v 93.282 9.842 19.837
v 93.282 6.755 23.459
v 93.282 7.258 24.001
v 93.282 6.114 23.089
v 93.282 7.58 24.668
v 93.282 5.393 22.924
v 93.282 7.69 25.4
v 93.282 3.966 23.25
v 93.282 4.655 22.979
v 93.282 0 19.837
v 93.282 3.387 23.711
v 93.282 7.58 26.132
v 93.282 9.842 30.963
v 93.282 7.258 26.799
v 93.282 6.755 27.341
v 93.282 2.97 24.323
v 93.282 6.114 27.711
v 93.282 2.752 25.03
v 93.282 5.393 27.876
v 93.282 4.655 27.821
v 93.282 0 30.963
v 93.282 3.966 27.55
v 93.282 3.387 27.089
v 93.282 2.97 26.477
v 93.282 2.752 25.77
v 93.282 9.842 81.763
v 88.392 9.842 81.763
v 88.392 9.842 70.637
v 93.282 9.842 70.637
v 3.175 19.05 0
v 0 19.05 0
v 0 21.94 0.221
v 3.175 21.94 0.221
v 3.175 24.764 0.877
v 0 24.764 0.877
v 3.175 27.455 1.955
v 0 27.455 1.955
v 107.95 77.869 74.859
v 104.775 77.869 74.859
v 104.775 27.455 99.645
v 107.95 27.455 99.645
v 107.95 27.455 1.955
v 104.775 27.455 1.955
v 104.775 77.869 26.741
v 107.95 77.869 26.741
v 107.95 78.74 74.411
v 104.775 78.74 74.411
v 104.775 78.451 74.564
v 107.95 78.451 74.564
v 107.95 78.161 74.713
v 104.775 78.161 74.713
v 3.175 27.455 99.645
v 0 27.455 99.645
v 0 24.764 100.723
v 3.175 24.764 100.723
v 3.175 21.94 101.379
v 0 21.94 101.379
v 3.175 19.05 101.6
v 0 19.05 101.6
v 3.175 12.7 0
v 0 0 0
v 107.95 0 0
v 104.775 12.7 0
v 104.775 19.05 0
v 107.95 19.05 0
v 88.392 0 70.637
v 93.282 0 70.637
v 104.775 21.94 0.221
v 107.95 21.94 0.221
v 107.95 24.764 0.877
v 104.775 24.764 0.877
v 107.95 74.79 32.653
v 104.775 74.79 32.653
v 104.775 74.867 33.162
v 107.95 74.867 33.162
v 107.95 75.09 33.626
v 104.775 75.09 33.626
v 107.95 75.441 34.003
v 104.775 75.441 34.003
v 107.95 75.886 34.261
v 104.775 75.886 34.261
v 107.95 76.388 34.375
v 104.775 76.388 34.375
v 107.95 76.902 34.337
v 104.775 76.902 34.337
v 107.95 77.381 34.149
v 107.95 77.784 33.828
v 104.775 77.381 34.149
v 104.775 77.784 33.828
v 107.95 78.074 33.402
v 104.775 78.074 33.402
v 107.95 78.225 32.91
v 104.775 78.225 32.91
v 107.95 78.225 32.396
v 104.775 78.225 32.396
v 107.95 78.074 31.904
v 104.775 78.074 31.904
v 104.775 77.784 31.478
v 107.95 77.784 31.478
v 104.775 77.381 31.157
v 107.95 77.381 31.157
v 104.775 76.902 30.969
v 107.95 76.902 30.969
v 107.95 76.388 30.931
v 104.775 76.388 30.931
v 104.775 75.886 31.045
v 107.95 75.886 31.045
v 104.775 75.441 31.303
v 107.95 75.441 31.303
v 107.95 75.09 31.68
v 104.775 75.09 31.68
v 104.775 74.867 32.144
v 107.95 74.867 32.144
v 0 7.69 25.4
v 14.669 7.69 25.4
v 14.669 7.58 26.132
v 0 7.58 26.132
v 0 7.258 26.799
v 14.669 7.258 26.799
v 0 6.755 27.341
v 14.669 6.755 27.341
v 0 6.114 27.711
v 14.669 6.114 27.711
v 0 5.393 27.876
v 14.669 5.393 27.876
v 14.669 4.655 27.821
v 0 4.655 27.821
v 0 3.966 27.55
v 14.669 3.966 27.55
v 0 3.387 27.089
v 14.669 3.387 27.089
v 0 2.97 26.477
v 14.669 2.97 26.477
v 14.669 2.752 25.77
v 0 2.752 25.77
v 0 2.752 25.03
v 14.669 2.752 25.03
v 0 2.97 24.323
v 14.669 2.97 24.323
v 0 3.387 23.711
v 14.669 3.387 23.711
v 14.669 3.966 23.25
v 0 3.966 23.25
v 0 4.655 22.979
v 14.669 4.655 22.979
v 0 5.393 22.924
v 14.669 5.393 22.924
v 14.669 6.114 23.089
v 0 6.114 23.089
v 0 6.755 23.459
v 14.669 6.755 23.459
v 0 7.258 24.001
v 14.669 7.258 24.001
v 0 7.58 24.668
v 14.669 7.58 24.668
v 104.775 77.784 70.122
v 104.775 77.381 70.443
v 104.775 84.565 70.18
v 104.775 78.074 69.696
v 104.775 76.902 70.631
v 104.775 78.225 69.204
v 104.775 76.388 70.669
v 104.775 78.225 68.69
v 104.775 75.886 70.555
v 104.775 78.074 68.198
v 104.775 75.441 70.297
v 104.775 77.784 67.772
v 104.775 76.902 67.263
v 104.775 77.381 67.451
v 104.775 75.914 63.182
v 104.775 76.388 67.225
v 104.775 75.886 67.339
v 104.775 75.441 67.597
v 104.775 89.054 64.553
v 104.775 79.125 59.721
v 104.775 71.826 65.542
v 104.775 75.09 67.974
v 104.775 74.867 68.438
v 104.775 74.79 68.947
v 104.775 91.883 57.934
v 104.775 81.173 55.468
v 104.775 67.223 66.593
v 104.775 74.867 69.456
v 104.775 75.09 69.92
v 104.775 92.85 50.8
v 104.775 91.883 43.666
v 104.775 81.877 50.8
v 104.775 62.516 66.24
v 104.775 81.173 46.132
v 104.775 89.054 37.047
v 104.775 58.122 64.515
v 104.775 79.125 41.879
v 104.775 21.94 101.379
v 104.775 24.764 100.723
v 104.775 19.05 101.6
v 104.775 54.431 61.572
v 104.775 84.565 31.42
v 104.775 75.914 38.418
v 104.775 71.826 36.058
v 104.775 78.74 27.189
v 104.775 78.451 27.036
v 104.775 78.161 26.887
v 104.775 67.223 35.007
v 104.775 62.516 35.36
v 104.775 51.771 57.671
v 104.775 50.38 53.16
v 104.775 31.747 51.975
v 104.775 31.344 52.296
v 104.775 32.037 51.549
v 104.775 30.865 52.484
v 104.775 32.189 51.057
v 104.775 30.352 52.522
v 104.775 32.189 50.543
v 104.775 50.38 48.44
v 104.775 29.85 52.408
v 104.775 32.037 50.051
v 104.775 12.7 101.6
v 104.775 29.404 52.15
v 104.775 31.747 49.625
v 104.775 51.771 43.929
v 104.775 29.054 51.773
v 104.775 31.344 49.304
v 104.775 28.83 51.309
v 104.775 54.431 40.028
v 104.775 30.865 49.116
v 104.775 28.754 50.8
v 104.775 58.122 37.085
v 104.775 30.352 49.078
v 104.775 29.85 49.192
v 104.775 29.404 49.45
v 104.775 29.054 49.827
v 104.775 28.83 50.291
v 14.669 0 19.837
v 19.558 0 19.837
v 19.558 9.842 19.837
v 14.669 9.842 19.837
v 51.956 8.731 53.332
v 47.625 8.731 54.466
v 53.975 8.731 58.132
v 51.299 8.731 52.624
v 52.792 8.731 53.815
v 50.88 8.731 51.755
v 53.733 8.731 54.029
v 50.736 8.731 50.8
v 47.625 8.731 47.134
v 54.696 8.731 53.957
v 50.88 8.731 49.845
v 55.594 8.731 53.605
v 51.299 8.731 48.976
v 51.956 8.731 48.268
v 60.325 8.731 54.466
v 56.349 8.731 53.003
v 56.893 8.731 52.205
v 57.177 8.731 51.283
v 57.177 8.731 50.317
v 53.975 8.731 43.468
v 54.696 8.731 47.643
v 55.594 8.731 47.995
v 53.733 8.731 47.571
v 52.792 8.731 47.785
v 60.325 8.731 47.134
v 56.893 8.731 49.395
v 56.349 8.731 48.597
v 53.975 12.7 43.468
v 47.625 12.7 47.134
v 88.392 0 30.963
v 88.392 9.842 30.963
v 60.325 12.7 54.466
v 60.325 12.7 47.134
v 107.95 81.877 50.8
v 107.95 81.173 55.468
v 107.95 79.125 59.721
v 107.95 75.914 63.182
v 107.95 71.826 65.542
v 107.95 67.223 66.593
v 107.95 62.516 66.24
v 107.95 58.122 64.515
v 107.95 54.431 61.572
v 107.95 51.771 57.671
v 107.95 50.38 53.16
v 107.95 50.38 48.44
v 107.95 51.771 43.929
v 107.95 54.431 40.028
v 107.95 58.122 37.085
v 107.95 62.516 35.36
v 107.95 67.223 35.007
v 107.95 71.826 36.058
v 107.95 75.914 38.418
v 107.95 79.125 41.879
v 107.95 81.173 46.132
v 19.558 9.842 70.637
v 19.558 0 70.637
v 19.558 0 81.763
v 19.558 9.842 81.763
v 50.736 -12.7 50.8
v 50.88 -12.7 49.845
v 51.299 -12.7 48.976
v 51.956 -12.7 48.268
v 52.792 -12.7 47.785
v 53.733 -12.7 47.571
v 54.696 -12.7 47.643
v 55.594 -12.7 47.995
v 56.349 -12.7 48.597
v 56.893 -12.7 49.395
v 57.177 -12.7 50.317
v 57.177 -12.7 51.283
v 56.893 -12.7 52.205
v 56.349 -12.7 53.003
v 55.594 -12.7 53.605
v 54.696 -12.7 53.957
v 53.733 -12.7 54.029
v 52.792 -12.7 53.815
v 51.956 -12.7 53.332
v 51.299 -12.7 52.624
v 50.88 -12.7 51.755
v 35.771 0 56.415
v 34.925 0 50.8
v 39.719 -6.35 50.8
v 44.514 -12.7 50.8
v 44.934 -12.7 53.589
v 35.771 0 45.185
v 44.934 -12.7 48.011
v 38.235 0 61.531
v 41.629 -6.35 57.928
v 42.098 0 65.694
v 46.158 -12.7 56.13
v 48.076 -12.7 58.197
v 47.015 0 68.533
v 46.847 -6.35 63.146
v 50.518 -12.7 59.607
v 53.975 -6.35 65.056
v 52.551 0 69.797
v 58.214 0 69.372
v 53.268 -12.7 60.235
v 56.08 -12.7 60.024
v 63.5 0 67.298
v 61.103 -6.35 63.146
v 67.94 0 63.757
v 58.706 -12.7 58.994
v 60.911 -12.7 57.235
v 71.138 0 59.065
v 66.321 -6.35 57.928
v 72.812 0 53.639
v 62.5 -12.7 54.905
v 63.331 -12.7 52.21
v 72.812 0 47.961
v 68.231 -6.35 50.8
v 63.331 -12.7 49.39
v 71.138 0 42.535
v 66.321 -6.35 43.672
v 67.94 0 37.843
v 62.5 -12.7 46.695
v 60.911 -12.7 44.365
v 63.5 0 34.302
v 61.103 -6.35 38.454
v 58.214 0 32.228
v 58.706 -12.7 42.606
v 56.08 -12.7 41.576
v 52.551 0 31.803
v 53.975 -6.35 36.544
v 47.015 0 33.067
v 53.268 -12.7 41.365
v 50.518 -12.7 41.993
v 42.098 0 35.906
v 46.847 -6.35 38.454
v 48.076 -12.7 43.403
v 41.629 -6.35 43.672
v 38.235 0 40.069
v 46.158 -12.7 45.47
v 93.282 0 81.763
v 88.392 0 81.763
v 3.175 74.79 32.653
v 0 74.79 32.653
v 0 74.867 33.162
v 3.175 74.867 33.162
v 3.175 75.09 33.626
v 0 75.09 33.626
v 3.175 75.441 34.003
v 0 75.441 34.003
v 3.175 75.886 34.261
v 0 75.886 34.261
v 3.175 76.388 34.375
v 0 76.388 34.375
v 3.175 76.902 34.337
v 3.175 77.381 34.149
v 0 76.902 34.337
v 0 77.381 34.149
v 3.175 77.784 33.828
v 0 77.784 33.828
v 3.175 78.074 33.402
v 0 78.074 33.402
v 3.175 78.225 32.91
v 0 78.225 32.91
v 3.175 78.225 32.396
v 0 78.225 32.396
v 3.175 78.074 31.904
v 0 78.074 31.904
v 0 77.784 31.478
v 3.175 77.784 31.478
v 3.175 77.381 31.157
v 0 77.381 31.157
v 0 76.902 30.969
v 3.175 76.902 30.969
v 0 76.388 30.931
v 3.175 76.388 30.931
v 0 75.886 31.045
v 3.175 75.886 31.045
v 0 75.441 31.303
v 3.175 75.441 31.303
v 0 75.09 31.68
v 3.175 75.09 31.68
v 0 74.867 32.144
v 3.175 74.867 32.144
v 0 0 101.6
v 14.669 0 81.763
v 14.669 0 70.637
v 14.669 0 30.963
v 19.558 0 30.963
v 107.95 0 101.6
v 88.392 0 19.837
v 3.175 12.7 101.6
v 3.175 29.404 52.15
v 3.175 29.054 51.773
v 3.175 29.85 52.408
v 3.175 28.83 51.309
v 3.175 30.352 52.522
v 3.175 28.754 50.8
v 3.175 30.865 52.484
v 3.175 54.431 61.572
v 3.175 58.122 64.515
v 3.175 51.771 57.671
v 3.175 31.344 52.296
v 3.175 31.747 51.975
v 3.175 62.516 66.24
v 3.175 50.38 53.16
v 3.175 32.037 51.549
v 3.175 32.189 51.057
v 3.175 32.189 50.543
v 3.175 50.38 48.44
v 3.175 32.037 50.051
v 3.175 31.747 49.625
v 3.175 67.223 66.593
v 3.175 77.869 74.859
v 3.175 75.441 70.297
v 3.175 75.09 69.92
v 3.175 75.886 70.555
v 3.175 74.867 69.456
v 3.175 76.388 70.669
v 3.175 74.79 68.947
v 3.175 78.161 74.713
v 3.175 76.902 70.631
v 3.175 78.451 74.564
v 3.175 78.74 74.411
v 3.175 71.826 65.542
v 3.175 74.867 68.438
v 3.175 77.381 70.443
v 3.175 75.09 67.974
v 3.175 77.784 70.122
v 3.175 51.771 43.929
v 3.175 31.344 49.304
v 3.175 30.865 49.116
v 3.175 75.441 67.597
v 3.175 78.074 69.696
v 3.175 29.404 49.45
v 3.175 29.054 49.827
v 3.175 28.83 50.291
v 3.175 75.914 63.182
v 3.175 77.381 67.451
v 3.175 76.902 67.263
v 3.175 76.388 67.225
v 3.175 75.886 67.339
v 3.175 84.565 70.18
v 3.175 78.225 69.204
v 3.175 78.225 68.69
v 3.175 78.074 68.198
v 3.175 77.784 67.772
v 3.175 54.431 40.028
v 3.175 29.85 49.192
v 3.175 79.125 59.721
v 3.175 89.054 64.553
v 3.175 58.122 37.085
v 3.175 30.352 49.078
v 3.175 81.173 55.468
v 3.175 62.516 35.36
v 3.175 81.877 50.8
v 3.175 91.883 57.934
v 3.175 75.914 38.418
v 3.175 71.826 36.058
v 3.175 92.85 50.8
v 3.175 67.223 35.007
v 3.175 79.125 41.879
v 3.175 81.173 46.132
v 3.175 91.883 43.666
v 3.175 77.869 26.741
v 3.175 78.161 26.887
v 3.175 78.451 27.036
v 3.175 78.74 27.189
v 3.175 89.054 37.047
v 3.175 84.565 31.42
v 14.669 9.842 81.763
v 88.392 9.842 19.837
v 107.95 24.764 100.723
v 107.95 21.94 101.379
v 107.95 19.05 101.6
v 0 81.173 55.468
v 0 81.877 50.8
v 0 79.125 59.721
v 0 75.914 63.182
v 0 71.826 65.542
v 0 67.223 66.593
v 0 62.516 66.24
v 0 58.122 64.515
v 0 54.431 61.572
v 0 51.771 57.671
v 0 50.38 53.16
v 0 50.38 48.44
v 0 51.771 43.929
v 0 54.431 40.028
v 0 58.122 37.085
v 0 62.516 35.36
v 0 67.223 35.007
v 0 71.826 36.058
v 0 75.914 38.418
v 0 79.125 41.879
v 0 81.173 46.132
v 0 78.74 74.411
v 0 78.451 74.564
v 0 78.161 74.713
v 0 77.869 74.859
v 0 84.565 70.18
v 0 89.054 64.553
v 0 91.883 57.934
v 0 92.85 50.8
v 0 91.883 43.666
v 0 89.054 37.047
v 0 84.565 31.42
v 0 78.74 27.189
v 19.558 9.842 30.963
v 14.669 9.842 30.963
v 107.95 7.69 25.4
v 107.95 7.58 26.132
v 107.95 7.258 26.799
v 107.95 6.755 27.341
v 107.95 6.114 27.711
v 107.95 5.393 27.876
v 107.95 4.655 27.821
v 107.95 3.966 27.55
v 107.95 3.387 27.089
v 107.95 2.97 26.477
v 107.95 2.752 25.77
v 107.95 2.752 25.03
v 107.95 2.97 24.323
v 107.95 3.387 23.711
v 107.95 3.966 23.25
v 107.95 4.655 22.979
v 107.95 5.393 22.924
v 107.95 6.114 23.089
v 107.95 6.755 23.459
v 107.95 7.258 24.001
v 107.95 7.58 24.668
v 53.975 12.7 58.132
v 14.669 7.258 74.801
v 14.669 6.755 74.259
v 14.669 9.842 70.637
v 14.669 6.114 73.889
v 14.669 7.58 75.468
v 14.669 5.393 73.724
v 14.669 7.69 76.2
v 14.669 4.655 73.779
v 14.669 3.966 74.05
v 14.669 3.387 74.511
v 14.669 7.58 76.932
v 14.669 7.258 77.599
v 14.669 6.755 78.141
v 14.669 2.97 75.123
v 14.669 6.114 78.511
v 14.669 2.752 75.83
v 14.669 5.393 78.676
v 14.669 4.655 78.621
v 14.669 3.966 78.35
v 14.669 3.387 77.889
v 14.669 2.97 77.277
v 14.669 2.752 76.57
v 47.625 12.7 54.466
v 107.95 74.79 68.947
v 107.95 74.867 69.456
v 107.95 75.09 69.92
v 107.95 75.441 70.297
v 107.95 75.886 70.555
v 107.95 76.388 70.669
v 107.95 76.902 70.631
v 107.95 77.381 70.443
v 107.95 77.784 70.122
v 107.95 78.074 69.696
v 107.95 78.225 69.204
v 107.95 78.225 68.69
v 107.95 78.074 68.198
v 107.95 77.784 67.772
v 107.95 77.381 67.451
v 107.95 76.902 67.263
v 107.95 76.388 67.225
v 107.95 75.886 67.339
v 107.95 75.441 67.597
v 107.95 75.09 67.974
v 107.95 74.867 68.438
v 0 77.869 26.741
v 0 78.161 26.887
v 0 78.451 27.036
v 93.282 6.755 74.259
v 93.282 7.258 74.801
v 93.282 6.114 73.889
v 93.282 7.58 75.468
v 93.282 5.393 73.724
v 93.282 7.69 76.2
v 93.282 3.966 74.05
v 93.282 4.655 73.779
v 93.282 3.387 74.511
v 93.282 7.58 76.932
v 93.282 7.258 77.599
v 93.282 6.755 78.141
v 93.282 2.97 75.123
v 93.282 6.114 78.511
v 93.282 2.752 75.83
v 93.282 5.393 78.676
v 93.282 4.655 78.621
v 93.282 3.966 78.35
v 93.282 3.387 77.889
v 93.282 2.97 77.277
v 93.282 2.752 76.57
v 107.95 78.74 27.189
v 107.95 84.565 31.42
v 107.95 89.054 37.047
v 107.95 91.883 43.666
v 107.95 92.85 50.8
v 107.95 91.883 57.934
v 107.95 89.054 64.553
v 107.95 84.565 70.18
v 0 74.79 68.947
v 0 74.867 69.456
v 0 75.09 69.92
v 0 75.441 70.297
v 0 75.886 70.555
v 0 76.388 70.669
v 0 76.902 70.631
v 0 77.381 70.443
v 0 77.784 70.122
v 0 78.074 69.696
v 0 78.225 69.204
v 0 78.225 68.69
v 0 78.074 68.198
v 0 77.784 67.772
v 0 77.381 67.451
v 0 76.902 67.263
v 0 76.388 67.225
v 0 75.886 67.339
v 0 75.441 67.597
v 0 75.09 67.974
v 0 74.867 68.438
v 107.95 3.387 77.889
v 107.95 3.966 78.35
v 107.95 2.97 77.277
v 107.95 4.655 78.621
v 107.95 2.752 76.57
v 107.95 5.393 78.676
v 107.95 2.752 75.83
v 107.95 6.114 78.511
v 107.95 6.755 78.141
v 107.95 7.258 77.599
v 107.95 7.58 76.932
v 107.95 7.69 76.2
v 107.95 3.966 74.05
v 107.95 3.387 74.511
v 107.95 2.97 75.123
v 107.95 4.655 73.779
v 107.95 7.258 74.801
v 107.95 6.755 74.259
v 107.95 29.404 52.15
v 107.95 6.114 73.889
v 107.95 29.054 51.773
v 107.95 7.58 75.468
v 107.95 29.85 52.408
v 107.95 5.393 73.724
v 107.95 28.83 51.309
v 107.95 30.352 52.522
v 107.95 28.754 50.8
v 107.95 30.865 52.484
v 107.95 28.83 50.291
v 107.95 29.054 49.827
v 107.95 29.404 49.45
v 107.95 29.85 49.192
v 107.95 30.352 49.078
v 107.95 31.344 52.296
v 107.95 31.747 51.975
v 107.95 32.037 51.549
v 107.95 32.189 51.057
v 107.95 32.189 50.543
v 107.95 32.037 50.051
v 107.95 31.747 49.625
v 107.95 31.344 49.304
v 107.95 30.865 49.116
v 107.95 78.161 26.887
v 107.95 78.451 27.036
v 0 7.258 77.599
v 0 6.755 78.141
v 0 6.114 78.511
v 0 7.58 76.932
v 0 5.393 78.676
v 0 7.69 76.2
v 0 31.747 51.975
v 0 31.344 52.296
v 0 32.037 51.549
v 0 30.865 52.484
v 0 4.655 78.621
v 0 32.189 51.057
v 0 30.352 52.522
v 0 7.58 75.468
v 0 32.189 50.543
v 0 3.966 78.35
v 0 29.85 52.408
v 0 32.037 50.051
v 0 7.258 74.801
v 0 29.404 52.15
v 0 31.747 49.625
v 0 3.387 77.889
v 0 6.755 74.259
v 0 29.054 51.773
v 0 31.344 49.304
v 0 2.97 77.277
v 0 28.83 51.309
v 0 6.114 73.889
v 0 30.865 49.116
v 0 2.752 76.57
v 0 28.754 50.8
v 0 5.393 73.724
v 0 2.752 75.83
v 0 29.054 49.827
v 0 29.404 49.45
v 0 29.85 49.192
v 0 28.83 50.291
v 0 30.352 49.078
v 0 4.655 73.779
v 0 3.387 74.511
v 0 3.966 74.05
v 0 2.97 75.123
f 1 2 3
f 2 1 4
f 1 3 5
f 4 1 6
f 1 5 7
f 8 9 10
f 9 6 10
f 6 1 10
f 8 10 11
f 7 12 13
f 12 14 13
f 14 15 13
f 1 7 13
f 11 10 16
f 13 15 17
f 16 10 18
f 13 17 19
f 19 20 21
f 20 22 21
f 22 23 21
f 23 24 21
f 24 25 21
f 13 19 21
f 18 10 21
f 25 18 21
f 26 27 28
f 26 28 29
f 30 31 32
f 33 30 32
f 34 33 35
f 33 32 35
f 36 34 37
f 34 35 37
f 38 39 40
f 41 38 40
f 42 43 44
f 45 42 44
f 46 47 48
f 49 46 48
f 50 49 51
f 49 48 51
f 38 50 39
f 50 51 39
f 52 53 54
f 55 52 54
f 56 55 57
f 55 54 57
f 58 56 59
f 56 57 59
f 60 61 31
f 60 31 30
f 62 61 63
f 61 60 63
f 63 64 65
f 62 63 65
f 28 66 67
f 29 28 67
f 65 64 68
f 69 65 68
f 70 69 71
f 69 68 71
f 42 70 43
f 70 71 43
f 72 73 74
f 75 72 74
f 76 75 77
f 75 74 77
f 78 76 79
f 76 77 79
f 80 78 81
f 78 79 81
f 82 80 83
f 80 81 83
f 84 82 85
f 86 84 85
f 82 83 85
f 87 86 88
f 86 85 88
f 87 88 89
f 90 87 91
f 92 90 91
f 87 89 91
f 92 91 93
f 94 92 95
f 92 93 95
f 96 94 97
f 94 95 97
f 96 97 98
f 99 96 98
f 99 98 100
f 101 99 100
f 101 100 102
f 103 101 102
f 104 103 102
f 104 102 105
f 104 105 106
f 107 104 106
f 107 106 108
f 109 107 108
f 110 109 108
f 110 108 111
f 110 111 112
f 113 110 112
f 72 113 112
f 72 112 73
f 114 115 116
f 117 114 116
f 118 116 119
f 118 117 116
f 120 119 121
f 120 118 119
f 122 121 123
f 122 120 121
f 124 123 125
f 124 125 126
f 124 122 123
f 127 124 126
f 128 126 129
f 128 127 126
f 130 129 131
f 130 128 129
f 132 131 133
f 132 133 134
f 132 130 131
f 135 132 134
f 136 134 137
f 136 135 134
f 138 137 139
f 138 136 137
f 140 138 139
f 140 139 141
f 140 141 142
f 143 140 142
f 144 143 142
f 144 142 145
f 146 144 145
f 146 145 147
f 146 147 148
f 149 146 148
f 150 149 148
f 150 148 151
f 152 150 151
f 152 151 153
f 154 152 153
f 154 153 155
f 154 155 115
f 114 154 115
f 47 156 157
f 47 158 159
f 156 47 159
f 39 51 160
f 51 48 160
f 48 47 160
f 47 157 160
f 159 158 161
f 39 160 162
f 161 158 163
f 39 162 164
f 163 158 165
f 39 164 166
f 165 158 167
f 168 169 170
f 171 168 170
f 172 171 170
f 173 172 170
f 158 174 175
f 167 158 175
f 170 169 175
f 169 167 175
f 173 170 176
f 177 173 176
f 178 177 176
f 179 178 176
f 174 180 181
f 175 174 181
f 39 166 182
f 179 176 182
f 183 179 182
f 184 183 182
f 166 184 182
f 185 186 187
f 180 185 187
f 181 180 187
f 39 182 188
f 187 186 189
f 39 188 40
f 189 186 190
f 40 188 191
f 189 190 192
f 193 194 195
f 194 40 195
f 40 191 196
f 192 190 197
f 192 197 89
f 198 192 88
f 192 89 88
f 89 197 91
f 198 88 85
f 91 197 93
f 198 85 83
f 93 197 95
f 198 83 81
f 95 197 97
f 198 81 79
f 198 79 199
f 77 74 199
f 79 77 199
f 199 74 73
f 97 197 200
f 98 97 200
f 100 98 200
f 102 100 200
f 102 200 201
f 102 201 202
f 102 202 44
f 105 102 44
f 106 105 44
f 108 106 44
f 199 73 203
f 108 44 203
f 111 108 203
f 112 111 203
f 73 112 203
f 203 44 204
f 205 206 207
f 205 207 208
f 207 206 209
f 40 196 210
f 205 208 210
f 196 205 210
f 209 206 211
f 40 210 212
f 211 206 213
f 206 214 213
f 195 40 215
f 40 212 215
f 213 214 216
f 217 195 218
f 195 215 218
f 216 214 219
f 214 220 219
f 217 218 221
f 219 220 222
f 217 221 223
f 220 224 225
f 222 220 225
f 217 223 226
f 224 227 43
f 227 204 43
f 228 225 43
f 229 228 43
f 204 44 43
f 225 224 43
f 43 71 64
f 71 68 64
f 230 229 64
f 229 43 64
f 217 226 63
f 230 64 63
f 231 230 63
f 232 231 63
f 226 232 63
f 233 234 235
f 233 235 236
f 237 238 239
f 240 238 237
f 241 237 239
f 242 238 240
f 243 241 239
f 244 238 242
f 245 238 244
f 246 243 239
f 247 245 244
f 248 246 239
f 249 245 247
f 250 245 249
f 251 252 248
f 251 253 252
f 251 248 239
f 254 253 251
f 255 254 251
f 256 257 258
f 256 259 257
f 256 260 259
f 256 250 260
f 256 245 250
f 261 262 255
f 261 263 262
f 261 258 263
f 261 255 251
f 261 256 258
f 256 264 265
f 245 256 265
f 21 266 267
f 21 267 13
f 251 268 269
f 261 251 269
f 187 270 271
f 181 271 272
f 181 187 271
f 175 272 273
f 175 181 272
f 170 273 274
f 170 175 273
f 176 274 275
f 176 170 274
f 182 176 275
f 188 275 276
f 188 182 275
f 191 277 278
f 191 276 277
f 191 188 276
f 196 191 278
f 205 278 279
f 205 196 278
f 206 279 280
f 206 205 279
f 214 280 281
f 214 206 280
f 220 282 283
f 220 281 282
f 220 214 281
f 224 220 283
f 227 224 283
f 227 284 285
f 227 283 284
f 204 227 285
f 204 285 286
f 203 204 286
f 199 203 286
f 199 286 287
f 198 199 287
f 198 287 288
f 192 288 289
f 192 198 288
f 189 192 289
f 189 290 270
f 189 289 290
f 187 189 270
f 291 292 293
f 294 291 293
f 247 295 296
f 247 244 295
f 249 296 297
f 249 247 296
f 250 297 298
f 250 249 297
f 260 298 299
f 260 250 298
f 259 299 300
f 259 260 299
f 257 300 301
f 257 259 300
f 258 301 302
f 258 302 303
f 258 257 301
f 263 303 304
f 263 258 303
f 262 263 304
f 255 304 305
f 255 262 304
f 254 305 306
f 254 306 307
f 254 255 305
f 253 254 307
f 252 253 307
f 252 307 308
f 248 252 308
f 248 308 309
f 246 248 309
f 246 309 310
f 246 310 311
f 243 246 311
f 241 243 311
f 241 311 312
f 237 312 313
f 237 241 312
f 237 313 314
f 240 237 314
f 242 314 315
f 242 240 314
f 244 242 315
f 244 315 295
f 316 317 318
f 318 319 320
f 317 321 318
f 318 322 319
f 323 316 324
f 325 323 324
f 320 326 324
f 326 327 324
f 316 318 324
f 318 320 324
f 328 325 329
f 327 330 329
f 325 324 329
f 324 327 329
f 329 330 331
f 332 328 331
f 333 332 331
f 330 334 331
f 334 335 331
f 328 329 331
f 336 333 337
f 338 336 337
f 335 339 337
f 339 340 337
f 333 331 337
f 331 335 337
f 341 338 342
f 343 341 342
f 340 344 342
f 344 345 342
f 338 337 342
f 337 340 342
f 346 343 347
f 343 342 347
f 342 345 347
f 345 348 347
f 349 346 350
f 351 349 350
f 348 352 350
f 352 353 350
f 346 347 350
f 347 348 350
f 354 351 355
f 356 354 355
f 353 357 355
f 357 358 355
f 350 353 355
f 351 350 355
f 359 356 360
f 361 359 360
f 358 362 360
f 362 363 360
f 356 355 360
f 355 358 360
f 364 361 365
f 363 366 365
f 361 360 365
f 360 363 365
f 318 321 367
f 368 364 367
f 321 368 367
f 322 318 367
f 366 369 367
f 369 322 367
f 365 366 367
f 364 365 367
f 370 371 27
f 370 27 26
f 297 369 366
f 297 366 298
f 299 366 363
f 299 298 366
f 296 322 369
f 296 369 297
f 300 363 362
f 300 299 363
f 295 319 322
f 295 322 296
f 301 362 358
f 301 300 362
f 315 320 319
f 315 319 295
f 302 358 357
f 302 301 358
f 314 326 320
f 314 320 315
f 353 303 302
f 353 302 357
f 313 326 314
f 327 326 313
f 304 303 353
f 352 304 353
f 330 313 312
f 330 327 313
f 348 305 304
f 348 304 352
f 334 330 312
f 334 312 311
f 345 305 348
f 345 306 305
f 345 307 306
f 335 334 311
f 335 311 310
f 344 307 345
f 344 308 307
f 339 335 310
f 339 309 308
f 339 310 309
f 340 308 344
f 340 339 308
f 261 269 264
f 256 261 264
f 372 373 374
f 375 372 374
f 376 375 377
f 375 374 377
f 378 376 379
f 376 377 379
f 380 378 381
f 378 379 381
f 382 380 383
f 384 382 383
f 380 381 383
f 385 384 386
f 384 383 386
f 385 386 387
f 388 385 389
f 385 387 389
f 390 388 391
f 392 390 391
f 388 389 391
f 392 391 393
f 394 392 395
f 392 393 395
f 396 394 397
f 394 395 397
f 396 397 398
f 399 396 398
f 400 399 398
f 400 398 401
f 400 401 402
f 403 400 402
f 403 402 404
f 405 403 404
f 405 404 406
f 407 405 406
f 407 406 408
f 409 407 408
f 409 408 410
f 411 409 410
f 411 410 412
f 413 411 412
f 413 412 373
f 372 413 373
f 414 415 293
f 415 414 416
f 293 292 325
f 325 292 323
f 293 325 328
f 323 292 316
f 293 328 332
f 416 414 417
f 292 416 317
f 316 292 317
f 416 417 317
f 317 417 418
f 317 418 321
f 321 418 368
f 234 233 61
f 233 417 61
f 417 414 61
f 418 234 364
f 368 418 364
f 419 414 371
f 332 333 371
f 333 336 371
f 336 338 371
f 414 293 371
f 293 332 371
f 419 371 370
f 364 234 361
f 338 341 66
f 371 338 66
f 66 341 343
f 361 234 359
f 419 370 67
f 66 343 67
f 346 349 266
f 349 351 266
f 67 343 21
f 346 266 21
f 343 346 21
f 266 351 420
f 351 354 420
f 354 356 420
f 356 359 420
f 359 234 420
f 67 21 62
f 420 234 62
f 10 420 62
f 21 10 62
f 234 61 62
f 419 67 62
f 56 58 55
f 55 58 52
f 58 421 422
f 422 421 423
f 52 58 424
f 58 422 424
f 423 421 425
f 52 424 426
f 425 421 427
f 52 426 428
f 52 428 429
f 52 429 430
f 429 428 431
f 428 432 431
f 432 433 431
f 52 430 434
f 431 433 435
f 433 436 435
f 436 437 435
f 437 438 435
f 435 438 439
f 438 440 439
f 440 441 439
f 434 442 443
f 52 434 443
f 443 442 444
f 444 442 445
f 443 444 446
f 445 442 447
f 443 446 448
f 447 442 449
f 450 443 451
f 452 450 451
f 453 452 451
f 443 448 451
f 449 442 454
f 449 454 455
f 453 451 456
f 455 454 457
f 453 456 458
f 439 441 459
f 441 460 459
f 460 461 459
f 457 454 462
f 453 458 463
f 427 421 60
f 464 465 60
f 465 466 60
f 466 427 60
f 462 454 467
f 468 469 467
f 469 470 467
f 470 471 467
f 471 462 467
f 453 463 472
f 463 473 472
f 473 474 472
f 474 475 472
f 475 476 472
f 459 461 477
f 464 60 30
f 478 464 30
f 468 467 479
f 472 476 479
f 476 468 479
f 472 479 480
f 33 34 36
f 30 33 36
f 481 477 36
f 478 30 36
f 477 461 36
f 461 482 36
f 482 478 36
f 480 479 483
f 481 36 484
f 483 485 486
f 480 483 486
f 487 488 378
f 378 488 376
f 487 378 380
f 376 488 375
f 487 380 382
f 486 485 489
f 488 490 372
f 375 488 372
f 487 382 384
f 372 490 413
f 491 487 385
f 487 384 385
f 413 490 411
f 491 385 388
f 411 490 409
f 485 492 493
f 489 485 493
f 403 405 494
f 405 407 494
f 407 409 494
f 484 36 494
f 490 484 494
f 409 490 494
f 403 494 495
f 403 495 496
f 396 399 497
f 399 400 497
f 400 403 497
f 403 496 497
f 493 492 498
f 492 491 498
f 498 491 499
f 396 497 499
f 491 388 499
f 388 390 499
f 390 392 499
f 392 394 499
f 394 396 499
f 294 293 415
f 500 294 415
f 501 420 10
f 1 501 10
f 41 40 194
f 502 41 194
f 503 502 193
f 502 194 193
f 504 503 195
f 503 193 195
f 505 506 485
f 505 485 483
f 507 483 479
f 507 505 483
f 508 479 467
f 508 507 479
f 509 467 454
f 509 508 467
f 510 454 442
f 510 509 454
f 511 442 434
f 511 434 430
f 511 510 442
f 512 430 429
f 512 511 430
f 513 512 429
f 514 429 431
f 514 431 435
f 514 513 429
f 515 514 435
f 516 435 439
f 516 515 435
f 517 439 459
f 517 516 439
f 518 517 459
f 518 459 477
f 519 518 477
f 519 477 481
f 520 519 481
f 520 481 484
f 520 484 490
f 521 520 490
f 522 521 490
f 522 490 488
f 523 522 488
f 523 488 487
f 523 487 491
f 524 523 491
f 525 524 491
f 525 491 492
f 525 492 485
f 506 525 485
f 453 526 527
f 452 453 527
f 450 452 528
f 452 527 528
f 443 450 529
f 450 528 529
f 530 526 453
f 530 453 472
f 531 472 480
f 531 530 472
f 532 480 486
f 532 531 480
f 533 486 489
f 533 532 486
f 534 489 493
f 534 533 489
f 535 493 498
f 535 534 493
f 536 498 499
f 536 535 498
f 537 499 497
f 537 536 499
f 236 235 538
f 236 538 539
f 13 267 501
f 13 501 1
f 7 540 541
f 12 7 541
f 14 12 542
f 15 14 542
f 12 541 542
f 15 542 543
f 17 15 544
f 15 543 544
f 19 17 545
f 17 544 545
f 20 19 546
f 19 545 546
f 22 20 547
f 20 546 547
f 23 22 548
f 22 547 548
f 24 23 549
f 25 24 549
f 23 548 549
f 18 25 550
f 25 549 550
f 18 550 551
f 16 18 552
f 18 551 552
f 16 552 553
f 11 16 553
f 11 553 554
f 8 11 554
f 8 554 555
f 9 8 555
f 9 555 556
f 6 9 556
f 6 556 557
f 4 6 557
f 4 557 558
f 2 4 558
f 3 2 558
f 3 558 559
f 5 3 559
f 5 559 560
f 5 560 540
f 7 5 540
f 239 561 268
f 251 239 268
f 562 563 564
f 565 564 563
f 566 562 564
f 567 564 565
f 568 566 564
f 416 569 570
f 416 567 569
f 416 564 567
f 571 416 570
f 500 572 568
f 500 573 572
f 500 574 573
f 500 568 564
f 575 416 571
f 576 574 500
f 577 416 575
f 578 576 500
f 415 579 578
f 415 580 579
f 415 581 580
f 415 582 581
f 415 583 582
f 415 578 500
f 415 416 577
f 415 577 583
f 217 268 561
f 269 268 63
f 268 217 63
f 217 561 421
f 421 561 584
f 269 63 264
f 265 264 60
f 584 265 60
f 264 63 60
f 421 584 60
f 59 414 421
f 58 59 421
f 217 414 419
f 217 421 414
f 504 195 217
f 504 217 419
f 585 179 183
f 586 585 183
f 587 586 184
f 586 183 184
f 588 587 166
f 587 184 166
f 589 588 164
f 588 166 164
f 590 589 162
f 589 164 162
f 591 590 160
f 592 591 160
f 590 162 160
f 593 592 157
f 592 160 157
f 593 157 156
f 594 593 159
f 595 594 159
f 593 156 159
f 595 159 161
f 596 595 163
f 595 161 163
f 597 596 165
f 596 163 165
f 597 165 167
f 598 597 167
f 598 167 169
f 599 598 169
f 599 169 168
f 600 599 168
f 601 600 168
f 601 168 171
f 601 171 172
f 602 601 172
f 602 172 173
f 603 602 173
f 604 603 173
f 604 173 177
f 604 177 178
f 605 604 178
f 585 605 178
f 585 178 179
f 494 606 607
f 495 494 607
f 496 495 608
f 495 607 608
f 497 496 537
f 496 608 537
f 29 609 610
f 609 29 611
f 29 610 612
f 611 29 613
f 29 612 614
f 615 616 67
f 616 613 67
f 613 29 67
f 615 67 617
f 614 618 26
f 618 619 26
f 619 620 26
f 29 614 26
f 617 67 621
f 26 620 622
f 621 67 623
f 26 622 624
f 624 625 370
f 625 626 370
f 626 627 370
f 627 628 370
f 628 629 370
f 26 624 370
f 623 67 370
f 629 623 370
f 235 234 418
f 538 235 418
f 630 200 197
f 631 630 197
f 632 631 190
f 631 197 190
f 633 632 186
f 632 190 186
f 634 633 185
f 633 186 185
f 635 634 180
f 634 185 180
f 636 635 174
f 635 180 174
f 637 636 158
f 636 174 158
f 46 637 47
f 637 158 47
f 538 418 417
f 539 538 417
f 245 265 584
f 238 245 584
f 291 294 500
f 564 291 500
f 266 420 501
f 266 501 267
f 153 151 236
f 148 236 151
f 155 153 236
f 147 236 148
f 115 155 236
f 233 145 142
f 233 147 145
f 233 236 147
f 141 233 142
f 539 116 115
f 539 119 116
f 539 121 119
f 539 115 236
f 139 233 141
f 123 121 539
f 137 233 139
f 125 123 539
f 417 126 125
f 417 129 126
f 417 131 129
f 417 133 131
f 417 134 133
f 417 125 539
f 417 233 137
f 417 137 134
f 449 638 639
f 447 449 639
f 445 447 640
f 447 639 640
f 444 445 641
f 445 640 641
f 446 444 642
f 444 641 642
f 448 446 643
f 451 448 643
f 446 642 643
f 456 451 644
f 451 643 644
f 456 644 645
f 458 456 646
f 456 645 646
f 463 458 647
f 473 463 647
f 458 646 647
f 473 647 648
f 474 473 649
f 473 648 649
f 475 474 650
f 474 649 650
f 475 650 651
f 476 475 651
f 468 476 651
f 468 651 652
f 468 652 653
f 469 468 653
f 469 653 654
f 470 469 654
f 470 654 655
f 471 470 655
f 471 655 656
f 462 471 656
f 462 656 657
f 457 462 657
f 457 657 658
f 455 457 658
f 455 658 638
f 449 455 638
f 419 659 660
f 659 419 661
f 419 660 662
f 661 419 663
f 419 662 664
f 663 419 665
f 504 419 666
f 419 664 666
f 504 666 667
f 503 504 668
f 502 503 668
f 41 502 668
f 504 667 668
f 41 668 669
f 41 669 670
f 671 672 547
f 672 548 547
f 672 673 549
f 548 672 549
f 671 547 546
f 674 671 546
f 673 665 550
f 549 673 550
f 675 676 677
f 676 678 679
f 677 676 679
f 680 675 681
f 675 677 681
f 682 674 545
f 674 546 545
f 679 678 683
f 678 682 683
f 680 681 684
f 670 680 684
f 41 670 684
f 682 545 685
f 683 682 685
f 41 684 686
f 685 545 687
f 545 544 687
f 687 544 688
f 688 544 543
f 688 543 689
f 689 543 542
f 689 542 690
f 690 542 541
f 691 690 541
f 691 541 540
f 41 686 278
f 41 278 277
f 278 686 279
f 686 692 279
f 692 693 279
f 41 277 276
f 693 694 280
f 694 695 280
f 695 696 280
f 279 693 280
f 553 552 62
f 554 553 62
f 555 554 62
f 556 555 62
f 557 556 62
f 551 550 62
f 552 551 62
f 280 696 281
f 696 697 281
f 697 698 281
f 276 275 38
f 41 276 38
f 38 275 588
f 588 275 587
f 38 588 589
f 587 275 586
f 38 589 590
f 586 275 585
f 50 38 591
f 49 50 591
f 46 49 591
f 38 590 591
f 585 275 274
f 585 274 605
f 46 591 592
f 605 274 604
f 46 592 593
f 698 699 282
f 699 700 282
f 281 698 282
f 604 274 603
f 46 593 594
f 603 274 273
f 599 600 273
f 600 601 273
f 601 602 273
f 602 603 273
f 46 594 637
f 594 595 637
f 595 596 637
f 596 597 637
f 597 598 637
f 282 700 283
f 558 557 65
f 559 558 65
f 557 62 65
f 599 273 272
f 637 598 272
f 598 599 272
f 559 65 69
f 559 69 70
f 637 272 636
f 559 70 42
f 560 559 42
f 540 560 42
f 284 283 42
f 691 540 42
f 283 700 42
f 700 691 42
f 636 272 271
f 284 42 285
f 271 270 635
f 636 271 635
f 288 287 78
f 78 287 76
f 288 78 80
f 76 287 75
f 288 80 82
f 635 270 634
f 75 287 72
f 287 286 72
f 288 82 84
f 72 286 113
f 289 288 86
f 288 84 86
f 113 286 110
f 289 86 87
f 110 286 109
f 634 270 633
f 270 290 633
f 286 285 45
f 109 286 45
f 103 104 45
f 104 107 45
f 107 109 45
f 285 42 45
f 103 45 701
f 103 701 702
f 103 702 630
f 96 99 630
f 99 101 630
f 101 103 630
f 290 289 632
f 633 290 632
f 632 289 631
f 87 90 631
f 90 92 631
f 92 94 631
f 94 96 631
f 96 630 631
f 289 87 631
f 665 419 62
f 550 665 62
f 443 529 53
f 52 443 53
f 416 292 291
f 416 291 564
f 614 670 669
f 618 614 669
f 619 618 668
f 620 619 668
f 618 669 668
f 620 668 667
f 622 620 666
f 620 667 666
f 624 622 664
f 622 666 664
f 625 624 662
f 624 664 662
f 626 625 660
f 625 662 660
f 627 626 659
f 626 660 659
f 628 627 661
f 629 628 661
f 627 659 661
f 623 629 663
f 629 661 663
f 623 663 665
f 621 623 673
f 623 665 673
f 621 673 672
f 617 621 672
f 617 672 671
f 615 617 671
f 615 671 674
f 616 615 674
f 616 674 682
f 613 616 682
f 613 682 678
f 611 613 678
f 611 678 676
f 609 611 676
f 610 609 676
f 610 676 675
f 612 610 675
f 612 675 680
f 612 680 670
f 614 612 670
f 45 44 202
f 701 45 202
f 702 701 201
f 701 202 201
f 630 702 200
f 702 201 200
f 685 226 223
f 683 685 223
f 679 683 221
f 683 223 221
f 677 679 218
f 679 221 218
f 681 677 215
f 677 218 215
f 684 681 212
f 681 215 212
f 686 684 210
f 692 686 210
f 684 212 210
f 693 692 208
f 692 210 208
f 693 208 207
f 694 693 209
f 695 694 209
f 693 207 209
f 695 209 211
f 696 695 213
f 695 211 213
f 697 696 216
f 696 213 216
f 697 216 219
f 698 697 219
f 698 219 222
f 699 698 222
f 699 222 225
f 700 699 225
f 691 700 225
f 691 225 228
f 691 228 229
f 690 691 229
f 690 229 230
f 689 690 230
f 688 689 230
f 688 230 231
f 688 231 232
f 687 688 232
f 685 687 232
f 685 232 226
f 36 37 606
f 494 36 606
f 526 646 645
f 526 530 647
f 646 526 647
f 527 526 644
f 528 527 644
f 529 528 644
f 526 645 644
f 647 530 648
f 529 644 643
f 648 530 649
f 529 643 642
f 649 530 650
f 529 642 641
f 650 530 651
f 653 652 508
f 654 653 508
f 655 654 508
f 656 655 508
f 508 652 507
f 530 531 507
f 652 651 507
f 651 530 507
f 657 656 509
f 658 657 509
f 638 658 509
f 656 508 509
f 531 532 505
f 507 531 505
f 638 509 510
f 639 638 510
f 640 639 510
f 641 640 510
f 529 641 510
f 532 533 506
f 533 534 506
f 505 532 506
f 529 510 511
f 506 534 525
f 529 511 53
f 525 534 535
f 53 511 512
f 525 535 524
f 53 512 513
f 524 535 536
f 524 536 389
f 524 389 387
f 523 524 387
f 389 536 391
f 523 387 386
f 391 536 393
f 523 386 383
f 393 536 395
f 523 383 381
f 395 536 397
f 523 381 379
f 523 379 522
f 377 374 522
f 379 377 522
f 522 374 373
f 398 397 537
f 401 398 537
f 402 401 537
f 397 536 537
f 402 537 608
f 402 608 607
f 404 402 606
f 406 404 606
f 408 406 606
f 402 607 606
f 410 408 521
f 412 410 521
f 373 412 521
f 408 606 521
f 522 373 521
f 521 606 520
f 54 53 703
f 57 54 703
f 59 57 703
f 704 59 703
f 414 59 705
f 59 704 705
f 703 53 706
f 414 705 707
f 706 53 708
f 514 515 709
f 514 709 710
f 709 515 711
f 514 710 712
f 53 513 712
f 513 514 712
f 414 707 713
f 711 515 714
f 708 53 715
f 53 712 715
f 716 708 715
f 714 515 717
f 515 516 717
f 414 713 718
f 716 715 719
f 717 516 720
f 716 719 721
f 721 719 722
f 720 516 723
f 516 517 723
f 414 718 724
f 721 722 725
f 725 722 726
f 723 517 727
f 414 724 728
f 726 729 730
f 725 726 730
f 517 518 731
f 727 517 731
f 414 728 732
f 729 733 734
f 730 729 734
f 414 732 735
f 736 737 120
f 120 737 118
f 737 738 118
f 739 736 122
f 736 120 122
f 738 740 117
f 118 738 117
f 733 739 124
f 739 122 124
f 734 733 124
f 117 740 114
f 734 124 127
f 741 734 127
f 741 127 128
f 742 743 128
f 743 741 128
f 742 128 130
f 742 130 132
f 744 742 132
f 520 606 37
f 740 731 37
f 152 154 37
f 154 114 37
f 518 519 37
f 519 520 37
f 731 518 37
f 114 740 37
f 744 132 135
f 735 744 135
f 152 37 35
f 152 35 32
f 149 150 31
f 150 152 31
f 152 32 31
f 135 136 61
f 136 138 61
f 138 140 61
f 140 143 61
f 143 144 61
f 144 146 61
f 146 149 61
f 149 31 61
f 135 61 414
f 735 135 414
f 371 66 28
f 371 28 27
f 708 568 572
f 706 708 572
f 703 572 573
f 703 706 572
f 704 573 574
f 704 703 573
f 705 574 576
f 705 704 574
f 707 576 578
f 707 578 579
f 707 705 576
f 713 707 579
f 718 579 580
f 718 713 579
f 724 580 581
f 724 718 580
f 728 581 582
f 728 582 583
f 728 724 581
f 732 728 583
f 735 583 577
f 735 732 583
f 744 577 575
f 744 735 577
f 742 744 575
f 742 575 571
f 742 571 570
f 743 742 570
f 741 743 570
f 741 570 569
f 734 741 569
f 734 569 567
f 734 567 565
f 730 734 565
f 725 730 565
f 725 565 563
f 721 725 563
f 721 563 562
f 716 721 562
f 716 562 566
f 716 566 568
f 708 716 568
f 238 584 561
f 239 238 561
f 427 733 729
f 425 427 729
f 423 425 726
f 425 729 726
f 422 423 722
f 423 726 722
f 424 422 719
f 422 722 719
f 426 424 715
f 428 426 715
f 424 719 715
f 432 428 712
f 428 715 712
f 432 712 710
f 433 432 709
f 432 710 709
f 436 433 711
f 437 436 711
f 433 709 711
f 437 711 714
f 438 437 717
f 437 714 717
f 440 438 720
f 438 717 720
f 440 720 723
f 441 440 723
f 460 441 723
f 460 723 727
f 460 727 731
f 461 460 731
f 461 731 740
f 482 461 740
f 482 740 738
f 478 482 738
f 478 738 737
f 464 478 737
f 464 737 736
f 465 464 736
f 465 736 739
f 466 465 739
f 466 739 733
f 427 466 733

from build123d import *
from build123d.topology import SkipClean

# Parameters (mm, degrees)
BOSS_EXTRUDE1_DEPTH               = 101.6
SKETCH3_R                         = 5.87375
CUT_EXTRUDE1_DEPTH                = 168.856337682
BOSS_EXTRUDE3_DEPTH               = 3.175
CUT_EXTRUDE2_DEPTH                = 3.96875
SKETCH5_R                         = 3.2385
CUT_EXTRUDE3_DEPTH                = 171.445522471
BOSS_EXTRUDE4_START               = -3.175
SKETCH7_R                         = 26.8097
SKETCH7_R_2                       = 5.87375
BOSS_EXTRUDE4_DEPTH               = 3.175
SKETCH6_R                         = 1.7272
CUT_EXTRUDE4_DEPTH                = 175.91949374
SKETCH8_W                         = 12.7
SKETCH8_H                         = 12.7
SKETCH8_R                         = 3.2385
BOSS_EXTRUDE5_DEPTH               = 12.7
CUT_EXTRUDE5_DEPTH                = 175.91949374
CUT_EXTRUDE5_DEPTH_BACK           = 175.91949374
SKETCH10_R                        = 15.8369
SKETCH13_W                        = 4.8895
SKETCH13_H                        = 11.125454
CUT_EXTRUDE7_DEPTH                = 9.8425
F_10_0_1935_DIAMETER_HOLE1_REACH  = 160.559
F_10_0_1935_DIAMETER_HOLE1_BORE_R = 2.48285


with BuildPart() as part:
    # Sketch2 → Boss-Extrude1 (new body)
    with BuildSketch(Plane.XY):
        Polygon((0, 78.74), (0, 0), (107.95, 0), (107.95, 78.74), (104.775, 78.74), (104.775, 12.7), (3.175, 12.7), (3.175, 78.74), align=None)
    extrude(amount=BOSS_EXTRUDE1_DEPTH)

    # Sketch3 → Cut-Extrude1 (cut, through all)
    with BuildSketch(Plane.ZY):
        with BuildLine():
            ThreePointArc((0, 19.05), (0.495062251, 23.364717272), (1.954518124, 27.455176943))
            Line((1.954518124, 27.455176943), (26.740958507, 77.868885684))
            ThreePointArc((26.740958507, 77.868885684), (26.961098465, 78.306490439), (27.189197089, 78.74))
            Line((27.189197089, 78.74), (0, 78.74))
            Line((0, 78.74), (0, 19.05))
        make_face()
        with BuildLine():
            Line((101.6, 78.74), (74.410802911, 78.74))
            ThreePointArc((74.410802911, 78.74), (74.638901535, 78.306490439), (74.859041493, 77.868885684))
            Line((74.859041493, 77.868885684), (99.645481876, 27.455176943))
            ThreePointArc((99.645481876, 27.455176943), (101.104937749, 23.364717272), (101.6, 19.05))
            Line((101.6, 19.05), (101.6, 78.74))
        make_face()
        with Locations(Location((50.8, 66.04, 0), (0, 0, 270))):
            Circle(SKETCH3_R)
    extrude(amount=-CUT_EXTRUDE1_DEPTH, mode=Mode.SUBTRACT)

    # Sketch3<4> → Boss-Extrude3 (add)
    with SkipClean():  # the faces are left unmerged after this step: merging them gives an invalid solid
        with BuildSketch(Plane.ZY):
            with BuildLine():
                ThreePointArc((74.410802911, 78.74), (50.8, 92.8497), (27.189197089, 78.74))
                Line((27.189197089, 78.74), (74.410802911, 78.74))
            make_face()
        extrude(amount=-BOSS_EXTRUDE3_DEPTH)

    # Sketch4 → Cut-Extrude2 (cut)
    with SkipClean():  # the faces are left unmerged after this step: merging them gives an invalid solid
        with BuildSketch(Plane(origin=(0, 12.7, 0), x_dir=(1, 0, 0), z_dir=(0, 1, 0))):
            Polygon((60.325, -47.133825791), (53.975, -43.467651581), (47.625, -47.133825791), (47.625, -54.466174209), (53.975, -58.132348419), (60.325, -54.466174209), align=None)
        extrude(amount=-CUT_EXTRUDE2_DEPTH, mode=Mode.SUBTRACT)

    # Sketch5 → Cut-Extrude3 (cut, through all)
    with SkipClean():  # the faces are left unmerged after this step: merging them gives an invalid solid
        with BuildSketch(Plane(origin=(0, 8.73125, 0), x_dir=(1, 0, 0), z_dir=(0, 1, 0))):
            with Locations(Location((53.975, -50.8, 0), (0, 0, 180))):
                Circle(SKETCH5_R)
        extrude(amount=-CUT_EXTRUDE3_DEPTH, mode=Mode.SUBTRACT)

    # Sketch7 → Boss-Extrude4 (add)
    with SkipClean():  # the faces are left unmerged after this step: merging them gives an invalid solid
        with BuildSketch(Plane(origin=(107.95, 0, 0), x_dir=(0, 0, -1), z_dir=(1, 0, 0)).offset(BOSS_EXTRUDE4_START)):
            with Locations((-50.8, 66.04)):
                Circle(SKETCH7_R)
            with Locations(Location((-50.8, 66.04, 0), (0, 0, 270))):
                Circle(SKETCH7_R_2, mode=Mode.SUBTRACT)
        extrude(amount=BOSS_EXTRUDE4_DEPTH)

    # Sketch6 → Cut-Extrude4 (cut, through all)
    with SkipClean():  # the faces are left unmerged after this step: merging them gives an invalid solid
        with BuildSketch(Plane.ZY):
            with Locations(Location((32.65297, 76.5175, 0), (0, 0, 270))):
                Circle(SKETCH6_R)
            with Locations(Location((68.94703, 76.5175, 0), (0, 0, 270))):
                Circle(SKETCH6_R)
            with Locations(Location((50.8, 30.480783465, 0), (0, 0, 270))):
                Circle(SKETCH6_R)
        extrude(amount=-CUT_EXTRUDE4_DEPTH, mode=Mode.SUBTRACT)

    # Sketch8 → Boss-Extrude5 (add)
    with SkipClean():  # the faces are left unmerged after this step: merging them gives an invalid solid
        with BuildSketch(Plane.XZ):
            with Locations((53.975, 50.8)):
                Rectangle(SKETCH8_W, SKETCH8_H)
            with Locations(Location((53.975, 50.8, 0), (0, 0, 180))):
                Circle(SKETCH8_R, mode=Mode.SUBTRACT)
        extrude(amount=BOSS_EXTRUDE5_DEPTH)

    # Sketch9 → Revolve1 (revolve)
    with SkipClean():  # the faces are left unmerged after this step: merging them gives an invalid solid
        with BuildSketch(Plane.ZY.offset(-53.975), mode=Mode.PRIVATE) as revolve1_sk:
            Polygon((44.45, -12.7), (44.45, 0), (31.75, 0), (41.3385, -12.7), align=None)
        revolve(revolve1_sk.sketch.rotate(Axis((53.975, -12.7, 50.8), (0, 1, 0)), 90), axis=Axis((53.975, -12.7, 50.8), (0, 1, 0)))

    # Sketch10 → Cut-Extrude5 (cut, two sides: drawn at the far end of the back side and taken through both)
    with SkipClean():  # the faces are left unmerged after this step: merging them gives an invalid solid
        with BuildSketch(Plane(origin=(107.95, 0, 0), x_dir=(0, 0, -1), z_dir=(1, 0, 0)).offset(-CUT_EXTRUDE5_DEPTH_BACK)):
            with Locations(Location((-50.8, 66.04, 0), (0, 0, 90))):
                Circle(SKETCH10_R)
        extrude(amount=CUT_EXTRUDE5_DEPTH + CUT_EXTRUDE5_DEPTH_BACK, mode=Mode.SUBTRACT)

    # Sketch13 → Cut-Extrude7 (cut)
    with SkipClean():  # the faces are left unmerged after this step: merging them gives an invalid solid
        with BuildSketch(Plane.XZ):
            with Locations((90.83675, 76.2)):
                Rectangle(SKETCH13_W, SKETCH13_H)
            with Locations((90.83675, 25.4)):
                Rectangle(SKETCH13_W, SKETCH13_H)
        cut_extrude7 = extrude(amount=-CUT_EXTRUDE7_DEPTH, mode=Mode.SUBTRACT)

    # #10 (0.1935) Diameter Hole1 bore (on position points) → #10 (0.1935) Diameter Hole1 (cut, up to next)
    with BuildSketch(Plane(origin=(107.95, 5.207, 76.2), x_dir=(0, 1, 0), z_dir=(1, 0, 0)), mode=Mode.PRIVATE) as f_10_0_1935_diameter_hole1_sk1:
        Circle(F_10_0_1935_DIAMETER_HOLE1_BORE_R)
    f_10_0_1935_diameter_hole1_tool1 = extrude(f_10_0_1935_diameter_hole1_sk1.sketch, amount=-F_10_0_1935_DIAMETER_HOLE1_REACH, mode=Mode.PRIVATE) & part.part
    # #10 (0.1935) Diameter Hole1 bore (on position points) → #10 (0.1935) Diameter Hole1 (cut, up to next)
    with BuildSketch(Plane(origin=(107.95, 5.207, 76.2), x_dir=(0, 1, 0), z_dir=(1, 0, 0)), mode=Mode.PRIVATE) as f_10_0_1935_diameter_hole1_sk2:
        with Locations((0, -50.8)):
            Circle(F_10_0_1935_DIAMETER_HOLE1_BORE_R)
    f_10_0_1935_diameter_hole1_tool2 = extrude(f_10_0_1935_diameter_hole1_sk2.sketch, amount=-F_10_0_1935_DIAMETER_HOLE1_REACH, mode=Mode.PRIVATE) & part.part
    f_10_0_1935_diameter_hole1_1 = f_10_0_1935_diameter_hole1_tool1.solids().sort_by_distance((107.95, 5.207, 76.2))[0]
    add(f_10_0_1935_diameter_hole1_1, mode=Mode.SUBTRACT)
    f_10_0_1935_diameter_hole1_2 = f_10_0_1935_diameter_hole1_tool2.solids().sort_by_distance((107.95, 5.207, 25.4))[0]
    add(f_10_0_1935_diameter_hole1_2, mode=Mode.SUBTRACT)
    f_10_0_1935_diameter_hole1 = f_10_0_1935_diameter_hole1_1 + f_10_0_1935_diameter_hole1_2  # #10 (0.1935) Diameter Hole1 as one shape, for the pattern or mirror that repeats it

    # Mirror2: Cut-Extrude7, #10 (0.1935) Diameter Hole1 across plane
    with SkipClean():  # the faces are left unmerged after this step: merging them gives an invalid solid
        add(cut_extrude7.mirror(Plane(origin=(53.975, 0, 0), x_dir=(0, 0, 1), z_dir=(1, 0, 0))), mode=Mode.SUBTRACT)
        add(f_10_0_1935_diameter_hole1.mirror(Plane(origin=(53.975, 0, 0), x_dir=(0, 0, 1), z_dir=(1, 0, 0))), mode=Mode.SUBTRACT)


solid = part.part
